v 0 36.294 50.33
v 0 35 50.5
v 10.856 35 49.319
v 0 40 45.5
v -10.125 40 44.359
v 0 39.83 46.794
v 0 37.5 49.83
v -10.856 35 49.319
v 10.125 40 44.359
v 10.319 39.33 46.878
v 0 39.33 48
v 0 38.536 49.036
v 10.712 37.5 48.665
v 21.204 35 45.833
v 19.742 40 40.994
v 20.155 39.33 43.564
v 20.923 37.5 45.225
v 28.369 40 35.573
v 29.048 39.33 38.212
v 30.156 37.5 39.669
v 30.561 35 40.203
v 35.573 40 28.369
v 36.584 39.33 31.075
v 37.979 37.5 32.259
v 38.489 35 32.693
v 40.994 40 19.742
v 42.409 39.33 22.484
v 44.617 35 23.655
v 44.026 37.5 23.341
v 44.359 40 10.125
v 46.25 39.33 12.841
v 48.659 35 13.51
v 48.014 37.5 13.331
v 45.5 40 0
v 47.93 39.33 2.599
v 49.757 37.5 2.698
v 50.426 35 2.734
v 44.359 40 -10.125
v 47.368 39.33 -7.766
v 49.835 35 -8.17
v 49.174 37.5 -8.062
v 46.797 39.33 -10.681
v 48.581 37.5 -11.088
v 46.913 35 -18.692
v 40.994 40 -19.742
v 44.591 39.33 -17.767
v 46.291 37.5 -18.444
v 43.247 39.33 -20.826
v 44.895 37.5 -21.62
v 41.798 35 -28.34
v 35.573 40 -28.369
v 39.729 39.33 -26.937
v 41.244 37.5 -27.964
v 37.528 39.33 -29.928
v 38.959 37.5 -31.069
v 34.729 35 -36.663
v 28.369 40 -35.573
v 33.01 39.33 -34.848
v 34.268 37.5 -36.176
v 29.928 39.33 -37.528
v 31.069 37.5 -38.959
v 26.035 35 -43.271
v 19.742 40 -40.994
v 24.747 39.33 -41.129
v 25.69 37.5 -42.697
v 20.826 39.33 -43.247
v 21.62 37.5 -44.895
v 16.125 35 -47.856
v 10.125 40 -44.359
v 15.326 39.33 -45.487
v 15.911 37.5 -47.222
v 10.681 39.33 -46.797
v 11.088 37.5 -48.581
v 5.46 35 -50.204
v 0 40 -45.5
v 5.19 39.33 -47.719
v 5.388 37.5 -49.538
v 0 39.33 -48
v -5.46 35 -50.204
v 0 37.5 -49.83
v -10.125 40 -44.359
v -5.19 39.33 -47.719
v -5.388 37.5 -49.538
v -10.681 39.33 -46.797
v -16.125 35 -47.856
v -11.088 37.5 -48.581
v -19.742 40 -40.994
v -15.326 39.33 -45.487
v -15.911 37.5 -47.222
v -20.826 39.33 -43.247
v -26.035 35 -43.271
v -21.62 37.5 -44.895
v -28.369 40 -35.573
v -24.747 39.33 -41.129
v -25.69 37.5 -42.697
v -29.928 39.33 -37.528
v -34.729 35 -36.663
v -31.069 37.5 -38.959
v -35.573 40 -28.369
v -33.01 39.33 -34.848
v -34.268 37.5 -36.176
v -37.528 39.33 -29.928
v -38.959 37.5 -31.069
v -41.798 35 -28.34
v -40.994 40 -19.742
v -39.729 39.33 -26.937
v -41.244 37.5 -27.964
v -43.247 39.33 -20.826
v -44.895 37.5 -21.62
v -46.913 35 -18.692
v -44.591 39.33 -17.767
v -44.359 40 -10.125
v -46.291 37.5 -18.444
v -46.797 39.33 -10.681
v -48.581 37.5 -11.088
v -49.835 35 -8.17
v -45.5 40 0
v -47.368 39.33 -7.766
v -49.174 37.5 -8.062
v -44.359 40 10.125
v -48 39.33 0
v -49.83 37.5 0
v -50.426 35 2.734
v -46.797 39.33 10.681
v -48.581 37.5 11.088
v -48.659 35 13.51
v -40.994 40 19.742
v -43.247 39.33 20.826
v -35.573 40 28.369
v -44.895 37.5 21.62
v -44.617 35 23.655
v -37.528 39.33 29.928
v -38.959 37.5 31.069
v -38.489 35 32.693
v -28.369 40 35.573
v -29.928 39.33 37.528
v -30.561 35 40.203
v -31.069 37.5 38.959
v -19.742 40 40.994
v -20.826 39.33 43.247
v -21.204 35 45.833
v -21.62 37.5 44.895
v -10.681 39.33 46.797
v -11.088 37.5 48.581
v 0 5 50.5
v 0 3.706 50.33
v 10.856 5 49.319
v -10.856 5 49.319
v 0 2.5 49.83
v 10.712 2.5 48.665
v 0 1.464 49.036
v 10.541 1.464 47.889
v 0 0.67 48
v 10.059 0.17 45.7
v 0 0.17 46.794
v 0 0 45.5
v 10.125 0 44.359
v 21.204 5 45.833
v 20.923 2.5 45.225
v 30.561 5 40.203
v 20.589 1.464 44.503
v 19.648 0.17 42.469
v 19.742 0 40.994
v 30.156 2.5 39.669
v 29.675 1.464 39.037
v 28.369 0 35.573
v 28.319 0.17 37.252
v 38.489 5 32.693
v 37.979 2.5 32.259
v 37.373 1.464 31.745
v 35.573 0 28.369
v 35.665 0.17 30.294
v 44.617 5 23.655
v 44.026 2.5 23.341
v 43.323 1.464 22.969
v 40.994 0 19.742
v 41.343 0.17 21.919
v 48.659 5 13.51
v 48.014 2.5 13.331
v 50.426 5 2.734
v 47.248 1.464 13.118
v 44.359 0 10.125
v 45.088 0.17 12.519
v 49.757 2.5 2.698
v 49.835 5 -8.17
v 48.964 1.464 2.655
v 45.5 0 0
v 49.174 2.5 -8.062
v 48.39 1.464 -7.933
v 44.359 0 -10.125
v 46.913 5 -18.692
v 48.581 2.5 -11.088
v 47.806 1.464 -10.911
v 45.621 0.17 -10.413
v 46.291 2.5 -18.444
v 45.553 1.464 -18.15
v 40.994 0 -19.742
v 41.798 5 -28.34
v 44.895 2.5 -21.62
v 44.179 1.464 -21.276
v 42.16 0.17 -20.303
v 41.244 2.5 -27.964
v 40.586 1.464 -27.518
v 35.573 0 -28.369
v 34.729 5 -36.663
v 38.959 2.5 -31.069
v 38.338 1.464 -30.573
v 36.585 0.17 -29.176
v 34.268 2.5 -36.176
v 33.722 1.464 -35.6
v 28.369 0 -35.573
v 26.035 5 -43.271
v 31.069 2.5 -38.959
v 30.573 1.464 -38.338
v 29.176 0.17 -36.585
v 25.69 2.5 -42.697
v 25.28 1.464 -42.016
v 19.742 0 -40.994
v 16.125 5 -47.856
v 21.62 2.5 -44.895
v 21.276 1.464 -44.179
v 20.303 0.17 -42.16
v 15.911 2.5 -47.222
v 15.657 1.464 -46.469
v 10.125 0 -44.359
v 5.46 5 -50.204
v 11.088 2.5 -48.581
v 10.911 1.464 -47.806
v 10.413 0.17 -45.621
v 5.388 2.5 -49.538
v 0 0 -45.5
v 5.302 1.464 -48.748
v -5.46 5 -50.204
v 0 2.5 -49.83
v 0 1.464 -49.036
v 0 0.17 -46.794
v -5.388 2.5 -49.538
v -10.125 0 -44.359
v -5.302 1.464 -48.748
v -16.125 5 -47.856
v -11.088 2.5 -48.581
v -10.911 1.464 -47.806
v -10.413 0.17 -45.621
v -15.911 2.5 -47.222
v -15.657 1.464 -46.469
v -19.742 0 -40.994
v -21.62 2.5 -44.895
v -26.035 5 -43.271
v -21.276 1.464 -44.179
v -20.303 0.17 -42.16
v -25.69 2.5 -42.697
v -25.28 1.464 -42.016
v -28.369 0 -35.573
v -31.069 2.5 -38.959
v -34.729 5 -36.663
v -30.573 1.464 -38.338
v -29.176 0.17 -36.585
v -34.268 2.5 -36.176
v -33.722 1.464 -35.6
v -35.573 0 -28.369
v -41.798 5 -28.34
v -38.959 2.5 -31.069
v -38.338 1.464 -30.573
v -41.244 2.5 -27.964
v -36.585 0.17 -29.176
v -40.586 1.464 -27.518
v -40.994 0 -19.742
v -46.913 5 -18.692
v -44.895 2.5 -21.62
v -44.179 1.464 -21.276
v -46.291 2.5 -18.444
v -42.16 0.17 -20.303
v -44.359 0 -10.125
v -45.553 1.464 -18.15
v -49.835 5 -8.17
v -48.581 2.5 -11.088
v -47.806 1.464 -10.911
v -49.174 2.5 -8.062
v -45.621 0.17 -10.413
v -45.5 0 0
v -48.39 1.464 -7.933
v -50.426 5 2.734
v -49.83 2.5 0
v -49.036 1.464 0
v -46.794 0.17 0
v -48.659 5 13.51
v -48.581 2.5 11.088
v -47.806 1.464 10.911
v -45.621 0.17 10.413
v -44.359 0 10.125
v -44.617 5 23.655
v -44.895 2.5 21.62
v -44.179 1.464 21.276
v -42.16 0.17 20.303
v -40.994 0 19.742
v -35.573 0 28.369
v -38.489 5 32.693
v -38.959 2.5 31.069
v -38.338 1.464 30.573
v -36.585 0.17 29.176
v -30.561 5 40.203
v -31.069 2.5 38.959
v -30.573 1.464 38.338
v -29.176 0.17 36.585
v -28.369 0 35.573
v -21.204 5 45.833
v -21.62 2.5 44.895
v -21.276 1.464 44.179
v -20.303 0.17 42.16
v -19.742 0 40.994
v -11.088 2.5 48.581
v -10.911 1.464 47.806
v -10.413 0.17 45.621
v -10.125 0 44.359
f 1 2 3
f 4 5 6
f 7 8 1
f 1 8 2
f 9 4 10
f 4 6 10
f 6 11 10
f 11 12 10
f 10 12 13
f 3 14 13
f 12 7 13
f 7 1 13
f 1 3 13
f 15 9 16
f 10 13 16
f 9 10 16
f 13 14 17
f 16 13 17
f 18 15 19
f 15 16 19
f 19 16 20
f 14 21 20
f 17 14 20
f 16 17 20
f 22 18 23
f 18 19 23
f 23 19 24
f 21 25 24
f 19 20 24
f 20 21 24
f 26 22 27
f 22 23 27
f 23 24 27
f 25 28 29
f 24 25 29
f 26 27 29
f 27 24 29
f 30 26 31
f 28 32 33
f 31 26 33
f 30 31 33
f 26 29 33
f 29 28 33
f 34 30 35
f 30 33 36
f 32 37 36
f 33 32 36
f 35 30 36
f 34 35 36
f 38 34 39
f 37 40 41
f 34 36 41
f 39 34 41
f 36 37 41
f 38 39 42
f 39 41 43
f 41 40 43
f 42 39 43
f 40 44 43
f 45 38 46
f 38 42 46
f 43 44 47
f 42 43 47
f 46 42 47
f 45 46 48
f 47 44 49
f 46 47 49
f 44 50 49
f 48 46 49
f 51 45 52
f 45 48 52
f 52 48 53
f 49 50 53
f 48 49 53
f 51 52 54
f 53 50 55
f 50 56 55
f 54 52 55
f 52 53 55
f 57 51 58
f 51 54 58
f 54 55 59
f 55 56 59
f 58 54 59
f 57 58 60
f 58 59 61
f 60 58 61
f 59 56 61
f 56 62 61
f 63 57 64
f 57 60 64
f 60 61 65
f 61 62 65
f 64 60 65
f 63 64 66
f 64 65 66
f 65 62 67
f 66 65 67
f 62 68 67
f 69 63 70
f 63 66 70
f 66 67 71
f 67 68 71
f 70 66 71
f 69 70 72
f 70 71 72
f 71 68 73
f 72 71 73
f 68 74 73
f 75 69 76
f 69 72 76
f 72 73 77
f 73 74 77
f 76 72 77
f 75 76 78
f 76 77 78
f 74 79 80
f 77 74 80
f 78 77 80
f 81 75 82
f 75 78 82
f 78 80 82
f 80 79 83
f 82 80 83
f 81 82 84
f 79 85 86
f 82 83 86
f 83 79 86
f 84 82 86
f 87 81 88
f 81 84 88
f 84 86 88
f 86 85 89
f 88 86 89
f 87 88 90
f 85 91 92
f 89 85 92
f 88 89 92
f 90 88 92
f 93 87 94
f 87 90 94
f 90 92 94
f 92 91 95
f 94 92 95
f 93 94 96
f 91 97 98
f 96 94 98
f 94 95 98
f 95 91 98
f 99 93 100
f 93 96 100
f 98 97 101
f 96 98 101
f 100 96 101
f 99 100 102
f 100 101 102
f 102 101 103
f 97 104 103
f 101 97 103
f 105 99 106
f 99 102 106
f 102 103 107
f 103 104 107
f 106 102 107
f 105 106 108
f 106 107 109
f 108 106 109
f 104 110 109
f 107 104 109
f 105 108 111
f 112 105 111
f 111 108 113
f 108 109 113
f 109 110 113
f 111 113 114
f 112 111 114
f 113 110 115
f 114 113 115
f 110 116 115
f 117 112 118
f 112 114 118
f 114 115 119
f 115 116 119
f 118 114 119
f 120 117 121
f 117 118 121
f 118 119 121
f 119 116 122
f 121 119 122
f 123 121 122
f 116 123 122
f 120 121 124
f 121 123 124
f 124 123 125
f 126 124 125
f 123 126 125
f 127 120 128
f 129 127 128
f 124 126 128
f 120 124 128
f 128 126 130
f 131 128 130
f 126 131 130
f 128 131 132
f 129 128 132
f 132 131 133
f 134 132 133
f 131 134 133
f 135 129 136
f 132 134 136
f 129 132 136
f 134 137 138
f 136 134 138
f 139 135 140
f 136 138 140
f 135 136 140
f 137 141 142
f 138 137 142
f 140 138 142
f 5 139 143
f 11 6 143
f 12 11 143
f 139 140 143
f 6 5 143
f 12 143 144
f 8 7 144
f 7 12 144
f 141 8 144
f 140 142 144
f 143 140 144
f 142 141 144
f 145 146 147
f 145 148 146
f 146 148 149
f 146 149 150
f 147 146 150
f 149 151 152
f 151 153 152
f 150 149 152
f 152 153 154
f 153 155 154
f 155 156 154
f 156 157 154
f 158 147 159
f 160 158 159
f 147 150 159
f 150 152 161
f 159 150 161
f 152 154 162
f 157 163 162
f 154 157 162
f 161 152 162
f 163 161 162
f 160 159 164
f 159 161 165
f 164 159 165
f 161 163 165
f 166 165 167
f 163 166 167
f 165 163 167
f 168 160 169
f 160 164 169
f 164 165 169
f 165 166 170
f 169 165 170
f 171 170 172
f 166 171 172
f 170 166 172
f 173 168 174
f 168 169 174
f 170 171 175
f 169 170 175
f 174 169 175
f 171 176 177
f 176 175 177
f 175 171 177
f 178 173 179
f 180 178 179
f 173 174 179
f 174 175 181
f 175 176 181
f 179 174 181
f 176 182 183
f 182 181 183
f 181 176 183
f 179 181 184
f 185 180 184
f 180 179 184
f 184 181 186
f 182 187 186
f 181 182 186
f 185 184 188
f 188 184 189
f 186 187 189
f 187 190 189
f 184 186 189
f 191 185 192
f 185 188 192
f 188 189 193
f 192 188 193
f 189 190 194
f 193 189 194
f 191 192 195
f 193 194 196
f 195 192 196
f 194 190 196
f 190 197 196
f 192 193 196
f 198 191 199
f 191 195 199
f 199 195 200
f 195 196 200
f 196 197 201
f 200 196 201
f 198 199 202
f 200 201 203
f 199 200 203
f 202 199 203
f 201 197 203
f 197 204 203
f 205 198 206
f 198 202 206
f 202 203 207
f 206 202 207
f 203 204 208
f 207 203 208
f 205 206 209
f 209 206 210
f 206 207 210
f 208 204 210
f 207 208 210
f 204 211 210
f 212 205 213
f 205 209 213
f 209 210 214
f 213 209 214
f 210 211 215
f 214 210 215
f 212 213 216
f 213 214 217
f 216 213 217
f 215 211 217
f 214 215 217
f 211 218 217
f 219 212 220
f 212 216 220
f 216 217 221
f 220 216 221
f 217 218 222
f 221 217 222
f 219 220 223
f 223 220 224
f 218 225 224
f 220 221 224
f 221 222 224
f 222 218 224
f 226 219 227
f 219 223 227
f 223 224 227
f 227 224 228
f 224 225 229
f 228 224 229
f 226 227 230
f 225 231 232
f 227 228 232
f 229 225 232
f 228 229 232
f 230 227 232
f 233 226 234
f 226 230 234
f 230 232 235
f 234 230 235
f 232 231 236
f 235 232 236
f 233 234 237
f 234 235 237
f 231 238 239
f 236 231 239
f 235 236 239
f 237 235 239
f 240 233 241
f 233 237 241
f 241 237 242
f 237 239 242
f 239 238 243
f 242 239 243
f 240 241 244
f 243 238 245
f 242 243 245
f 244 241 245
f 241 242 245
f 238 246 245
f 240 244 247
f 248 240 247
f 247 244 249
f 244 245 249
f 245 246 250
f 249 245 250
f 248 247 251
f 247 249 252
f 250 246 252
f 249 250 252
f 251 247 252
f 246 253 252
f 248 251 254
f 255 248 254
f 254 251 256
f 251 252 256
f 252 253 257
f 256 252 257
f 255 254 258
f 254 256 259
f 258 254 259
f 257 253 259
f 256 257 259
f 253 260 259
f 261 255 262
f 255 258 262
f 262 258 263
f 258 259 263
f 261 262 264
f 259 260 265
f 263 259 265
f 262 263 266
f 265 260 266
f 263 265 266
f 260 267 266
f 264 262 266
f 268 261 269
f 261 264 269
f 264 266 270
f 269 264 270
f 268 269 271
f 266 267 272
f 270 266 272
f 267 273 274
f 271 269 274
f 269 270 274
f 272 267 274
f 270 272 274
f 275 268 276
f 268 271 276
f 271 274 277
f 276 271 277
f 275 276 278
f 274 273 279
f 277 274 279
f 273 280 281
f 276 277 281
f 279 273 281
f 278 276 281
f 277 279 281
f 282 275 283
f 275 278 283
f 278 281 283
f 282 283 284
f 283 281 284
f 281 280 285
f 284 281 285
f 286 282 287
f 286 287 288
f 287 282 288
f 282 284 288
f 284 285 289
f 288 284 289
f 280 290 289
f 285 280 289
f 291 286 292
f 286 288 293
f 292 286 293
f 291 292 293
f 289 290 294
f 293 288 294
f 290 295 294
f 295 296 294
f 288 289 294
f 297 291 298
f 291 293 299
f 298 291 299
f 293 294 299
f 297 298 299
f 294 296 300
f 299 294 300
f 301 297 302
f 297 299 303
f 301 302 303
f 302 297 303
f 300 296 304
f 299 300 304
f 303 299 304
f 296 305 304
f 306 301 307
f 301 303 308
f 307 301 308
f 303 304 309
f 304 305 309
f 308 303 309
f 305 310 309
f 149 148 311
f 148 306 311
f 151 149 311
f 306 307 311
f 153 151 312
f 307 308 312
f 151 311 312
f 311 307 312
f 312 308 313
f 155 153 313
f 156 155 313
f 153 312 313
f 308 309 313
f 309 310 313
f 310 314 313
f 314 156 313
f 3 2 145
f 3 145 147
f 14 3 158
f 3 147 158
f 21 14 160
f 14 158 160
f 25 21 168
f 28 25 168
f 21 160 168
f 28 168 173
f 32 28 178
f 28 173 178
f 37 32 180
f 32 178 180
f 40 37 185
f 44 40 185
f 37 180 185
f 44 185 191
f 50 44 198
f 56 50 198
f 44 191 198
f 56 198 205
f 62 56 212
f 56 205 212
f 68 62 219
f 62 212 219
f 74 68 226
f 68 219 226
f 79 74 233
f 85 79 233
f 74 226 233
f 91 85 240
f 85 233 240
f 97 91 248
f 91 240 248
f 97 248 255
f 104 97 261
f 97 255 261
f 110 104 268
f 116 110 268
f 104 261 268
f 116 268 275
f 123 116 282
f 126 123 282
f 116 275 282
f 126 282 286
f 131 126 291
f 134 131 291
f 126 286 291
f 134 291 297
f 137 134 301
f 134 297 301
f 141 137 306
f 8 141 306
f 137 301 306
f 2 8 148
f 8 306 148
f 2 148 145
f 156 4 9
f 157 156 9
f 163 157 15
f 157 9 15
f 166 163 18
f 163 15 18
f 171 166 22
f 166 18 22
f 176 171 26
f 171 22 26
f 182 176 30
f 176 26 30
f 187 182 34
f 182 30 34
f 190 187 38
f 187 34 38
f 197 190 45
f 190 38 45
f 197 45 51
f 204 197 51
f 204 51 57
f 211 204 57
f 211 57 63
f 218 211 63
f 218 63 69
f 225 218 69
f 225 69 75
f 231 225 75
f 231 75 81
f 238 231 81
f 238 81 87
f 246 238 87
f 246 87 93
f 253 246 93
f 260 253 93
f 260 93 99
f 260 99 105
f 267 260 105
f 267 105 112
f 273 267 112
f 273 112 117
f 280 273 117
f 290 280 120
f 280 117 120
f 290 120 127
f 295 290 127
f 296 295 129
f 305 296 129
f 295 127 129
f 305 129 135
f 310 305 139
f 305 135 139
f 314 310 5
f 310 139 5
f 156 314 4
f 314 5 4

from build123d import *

# Parameters (mm, degrees)
SKETCH1_R            = 50.5
SKETCH1_R_2          = 45
SKETCH1_R_3          = 40
BOSS_EXTRUDE1_DEPTH  = 40
FILLET1_R            = 5
FILLET2_R            = 5
CUT_EXTRUDE1_START   = -0.5
SKETCH2_R            = 41.5
SKETCH2_R_2          = 40
CUT_EXTRUDE1_DEPTH   = 0.5
SKETCH3_R            = 1
BOSS_EXTRUDE2_DEPTH  = 5
SKETCH4_R            = 12
BOSS_EXTRUDE3_DEPTH  = 7.5
CUT_EXTRUDE2_DEPTH   = 5
SKETCH6_R            = 6
CUT_EXTRUDE3_DEPTH   = 79.259184829
BOSS_EXTRUDE10_START = -12.5
BOSS_EXTRUDE10_DEPTH = 12.5
CIRPATTERN2_START    = 27
CIRPATTERN2_DEPTH    = 12.5
SKETCH8_R            = 45.5
CUT_EXTRUDE4_DEPTH   = 82.85658196


# Read off the part's stored shape, not the designer's step: Boss-Extrude10, CirPattern2, Cut-Revolve1
with BuildPart() as part:
    # Sketch1 → Boss-Extrude1 (new body)
    # profile 1 of 2: a face of its own
    with BuildSketch(Plane(origin=(0, 0, 0), x_dir=(1, 0, 0), z_dir=(0, 1, 0))):
        with Locations(Location((0, 0, 0), (0, 0, 270))):
            Circle(SKETCH1_R)
        Circle(SKETCH1_R_2, mode=Mode.SUBTRACT)
    # profile 2 of 2: a face of its own
    with BuildSketch(Plane(origin=(0, 0, 0), x_dir=(1, 0, 0), z_dir=(0, 1, 0))):
        Circle(SKETCH1_R_2)
        with Locations(Location((0, 0, 0), (0, 0, 270))):
            Circle(SKETCH1_R_3, mode=Mode.SUBTRACT)
    extrude(amount=BOSS_EXTRUDE1_DEPTH)

    # Fillet1
    fillet1_edges = [part.edges().sort_by_distance(p)[0] for p in [
        (0, 40, -50.5),
    ]]
    fillet(fillet1_edges, radius=FILLET1_R)

    # Fillet2
    fillet2_edges = [part.edges().sort_by_distance(p)[0] for p in [
        (0, 0, -50.5),
    ]]
    fillet(fillet2_edges, radius=FILLET2_R)

    # Sketch2 → Cut-Extrude1 (cut)
    with BuildSketch(Plane(origin=(0, 40, 0), x_dir=(1, 0, 0), z_dir=(0, 1, 0)).offset(CUT_EXTRUDE1_START)):
        with Locations(Location((0, 0, 0), (0, 0, 270))):
            Circle(SKETCH2_R)
        with Locations(Location((0, 0, 0), (0, 0, 270))):
            Circle(SKETCH2_R_2, mode=Mode.SUBTRACT)
    extrude(amount=CUT_EXTRUDE1_DEPTH, mode=Mode.SUBTRACT)


with BuildPart() as body_2:
    # Sketch3 → Boss-Extrude2 (new body)
    with BuildSketch(Plane(origin=(0, 39.5, 0), x_dir=(1, 0, 0), z_dir=(0, 1, 0))):
        with Locations(Location((0, 0, 0), (0, 0, 270))):
            Circle(SKETCH3_R)
    extrude(amount=-BOSS_EXTRUDE2_DEPTH)

    # Sketch4 → Boss-Extrude3 (add)
    with BuildSketch(Plane.XZ.offset(-34.5)):
        with Locations(Location((0, 0, 0), (0, 0, 270))):
            Circle(SKETCH4_R)
    extrude(amount=BOSS_EXTRUDE3_DEPTH)

    # Sketch5 → Cut-Extrude2 (cut)
    with BuildSketch(Plane.XZ.offset(-27)):
        Polygon((1.172923904, 10.937287119), (-8.885506541, 6.484425457), (-10.058430445, -4.452861662), (-1.172923904, -10.937287119), (8.885506541, -6.484425457), (10.058430445, 4.452861662), align=None)
    extrude(amount=-CUT_EXTRUDE2_DEPTH, mode=Mode.SUBTRACT)

    # Sketch6 → Cut-Extrude3 (cut, through all)
    with BuildSketch(Plane.XZ.offset(-32)):
        with Locations(Location((0, 0, 0), (0, 0, 270))):
            Circle(SKETCH6_R)
    extrude(amount=-CUT_EXTRUDE3_DEPTH, mode=Mode.SUBTRACT)

    # Boss-Extrude10 outline → Boss-Extrude10 (add)
    with BuildSketch(Plane(origin=(0, 39.5, 0), x_dir=(1, 0, 0), z_dir=(0, 1, 0)).offset(BOSS_EXTRUDE10_START)):
        with BuildLine():
            ThreePointArc((-9.907874683, -6.770082663), (-10.682049717, -5.467523557), (-11.285904868, -4.077787551))
            ThreePointArc((-11.285904868, -4.077787551), (-11.291897259, -4.637537864), (-11.663342081, -5.056327867))
            Line((-11.663342081, -5.056327867), (-14.441281094, -6.530254709))
            ThreePointArc((-14.441281094, -6.530254709), (-15.188724822, -6.754494743), (-15.965085937, -6.675633223))
            Line((-15.965085937, -6.675633223), (-39.993984407, 0.693693915))
            ThreePointArc((-39.993984407, 0.693693915), (-39.913717484, -2.625863016), (-39.558397626, -5.927324632))
            ThreePointArc((-39.558397626, -5.927324632), (-38.549233859, -3.209595167), (-35.711897206, -2.614628217))
            Line((-35.711897206, -2.614628217), (-16.968675274, -8.362912276))
            ThreePointArc((-16.968675274, -8.362912276), (-16.496554918, -8.752791347), (-16.438401548, -9.362316987))
            Line((-16.438401548, -9.362316987), (-22.186706389, -28.105606681))
            ThreePointArc((-22.186706389, -28.105606681), (-24.270105502, -30.121529322), (-27.086328062, -29.433498469))
            ThreePointArc((-27.086328062, -29.433498469), (-25.333453103, -30.955066692), (-23.495271849, -32.372398749))
            Line((-23.495271849, -32.372398749), (-22.678682838, -32.949618279))
            Line((-22.678682838, -32.949618279), (-21.84791965, -33.506244298))
            Line((-21.84791965, -33.506244298), (-14.474389556, -9.463641401))
            ThreePointArc((-14.474389556, -9.463641401), (-14.104425603, -8.776547206), (-13.499682622, -8.283335601))
            Line((-13.499682622, -8.283335601), (-10.652684086, -6.77276696))
            ThreePointArc((-10.652684086, -6.77276696), (-10.280610826, -6.679459968), (-9.907874683, -6.770082663))
        make_face()
    extrude(amount=BOSS_EXTRUDE10_DEPTH)

    # CirPattern2 outline → CirPattern2 (add)
    with BuildSketch(Plane(origin=(0, 0, 0), x_dir=(1, 0, 0), z_dir=(0, 1, 0)).offset(CIRPATTERN2_START)):
        with BuildLine():
            ThreePointArc((-9.500432888, 7.330878183), (-8.500858804, 8.469675294), (-7.365742824, 9.473427714))
            ThreePointArc((-7.365742824, 9.473427714), (-7.899948758, 9.306154457), (-8.413024481, 9.530006248))
            Line((-8.413024481, 9.530006248), (-10.673242573, 11.716514805))
            ThreePointArc((-10.673242573, 11.716514805), (-11.117480333, 12.358082052), (-11.282387348, 13.120814899))
            Line((-11.282387348, 13.120814899), (-11.699078736, 38.250902692))
            ThreePointArc((-11.699078736, 38.250902692), (-14.831361144, 37.148764806), (-17.861437852, 35.790627793))
            ThreePointArc((-17.861437852, 35.790627793), (-14.964874781, 35.670680608), (-13.522242341, 33.156067994))
            Line((-13.522242341, 33.156067994), (-13.197211247, 13.553887176))
            ThreePointArc((-13.197211247, 13.553887176), (-13.422115065, 12.984394777), (-13.983838017, 12.740733854))
            Line((-13.983838017, 12.740733854), (-33.586089702, 12.415701585))
            ThreePointArc((-33.586089702, 12.415701585), (-36.147151798, 13.774177532), (-36.363056203, 16.665177575))
            ThreePointArc((-36.363056203, 16.665177575), (-37.268485425, 14.527903984), (-38.048419067, 12.341710032))
            Line((-38.048419067, 12.341710032), (-38.345047581, 11.386717087))
            Line((-38.345047581, 11.386717087), (-38.61771044, 10.424607444))
            Line((-38.61771044, 10.424607444), (-13.473290178, 10.841536484))
            ThreePointArc((-13.473290178, 10.841536484), (-12.705499618, 10.70200364), (-12.049551649, 10.279269655))
            Line((-12.049551649, 10.279269655), (-9.733144569, 8.038404527))
            ThreePointArc((-9.733144569, 8.038404527), (-9.529427386, 7.713375274), (-9.500432888, 7.330878183))
        make_face()
        with BuildLine():
            ThreePointArc((4.03628425, 11.300814548), (5.428230042, 10.702070763), (6.73362545, 9.932687868))
            ThreePointArc((6.73362545, 9.932687868), (6.409460418, 10.389057624), (6.463807004, 10.946195641))
            Line((6.463807004, 10.946195641), (7.844854414, 13.771459088))
            ThreePointArc((7.844854414, 13.771459088), (8.317744107, 14.392209487), (8.992187082, 14.784742791))
            Line((8.992187082, 14.784742791), (32.763556111, 22.946664049))
            ThreePointArc((32.763556111, 22.946664049), (30.747432198, 25.585062307), (28.519421945, 28.047149087))
            ThreePointArc((28.519421945, 28.047149087), (29.300432607, 25.255288185), (27.354691835, 23.106205171))
            Line((27.354691835, 23.106205171), (8.812350166, 16.739675231))
            ThreePointArc((8.812350166, 16.739675231), (8.201231607, 16.777588643), (7.795914361, 17.23652355))
            Line((7.795914361, 17.23652355), (1.429361404, 35.778932255))
            ThreePointArc((1.429361404, 35.778932255), (1.929937095, 38.634439204), (4.612723394, 39.733144639))
            ThreePointArc((4.612723394, 39.733144639), (2.300262401, 39.933805139), (-0.019944352, 39.999995028))
            Line((-0.019944352, 39.999995028), (-1.019859867, 39.986996459))
            Line((-1.019859867, 39.986996459), (-2.01913797, 39.949006018))
            Line((-2.01913797, 39.949006018), (6.147438285, 16.164079439))
            ThreePointArc((6.147438285, 16.164079439), (6.251994995, 15.390749203), (6.052650154, 14.636273627))
            Line((6.052650154, 14.636273627), (4.637269925, 11.740774173))
            ThreePointArc((4.637269925, 11.740774173), (4.391100809, 11.446588055), (4.03628425, 11.300814548))
        make_face()
        with BuildLine():
            ThreePointArc((11.994993743, -0.346590692), (11.855689469, -1.855431813), (11.52735222, -3.334689012))
            ThreePointArc((11.52735222, -3.334689012), (11.861213145, -2.885363735), (12.407876906, -2.764885294))
            Line((12.407876906, -2.764885294), (15.521629237, -3.205285014))
            ThreePointArc((15.521629237, -3.205285014), (16.258128901, -3.463207416), (16.839864598, -3.98334134))
            Line((16.839864598, -3.98334134), (31.948070005, -24.069084381))
            ThreePointArc((31.948070005, -24.069084381), (33.834319309, -21.336326696), (35.487409954, -18.45653637))
            ThreePointArc((35.487409954, -18.45653637), (33.073538017, -20.062054114), (30.428371647, -18.875647848))
            Line((30.428371647, -18.875647848), (18.643543171, -3.208198923))
            ThreePointArc((18.643543171, -3.208198923), (18.490754948, -2.615274747), (18.801978065, -2.087976452))
            Line((18.801978065, -2.087976452), (34.469483632, 9.69689463))
            ThreePointArc((34.469483632, 9.69689463), (37.339918519, 10.103219032), (39.213876041, 7.891256292))
            ThreePointArc((39.213876041, 7.891256292), (38.690125771, 10.152544892), (38.036092779, 12.379646445))
            Line((38.036092779, 12.379646445), (37.714739519, 13.326605833))
            Line((37.714739519, 13.326605833), (37.369814547, 14.265236092))
            Line((37.369814547, 14.265236092), (17.272615982, -0.851585994))
            ThreePointArc((17.272615982, -0.851585994), (16.569445022, -1.18999752), (15.790295166, -1.233555084))
            Line((15.790295166, -1.233555084), (12.599134998, -0.782207034))
            ThreePointArc((12.599134998, -0.782207034), (12.243276933, -0.638994801), (11.994993743, -0.346590692))
        make_face()
        with BuildLine():
            ThreePointArc((3.377029578, -11.515019376), (1.89898901, -11.848790687), (0.390670022, -11.99363902))
            ThreePointArc((0.390670022, -11.99363902), (0.921172454, -12.172310482), (1.204682652, -12.654988728))
            Line((1.204682652, -12.654988728), (1.748040016, -15.75243417))
            ThreePointArc((1.748040016, -15.75243417), (1.730332147, -16.53258938), (1.415421606, -17.246583128))
            Line((1.415421606, -17.246583128), (-13.018562973, -37.822176274))
            ThreePointArc((-13.018562973, -37.822176274), (-9.836672879, -38.7716374), (-6.586996421, -39.453915879))
            ThreePointArc((-6.586996421, -39.453915879), (-8.859861984, -37.654319512), (-8.548923935, -34.7719971))
            Line((-8.548923935, -34.7719971), (2.709993184, -18.722451208))
            ThreePointArc((2.709993184, -18.722451208), (3.226683428, -18.393917326), (3.824347139, -18.526963966))
            Line((3.824347139, -18.526963966), (19.873951055, -29.785921788))
            ThreePointArc((19.873951055, -29.785921788), (21.147401687, -32.390306446), (19.62278483, -34.856080037))
            ThreePointArc((19.62278483, -34.856080037), (21.611550355, -33.659187323), (23.527542489, -32.348952756))
            Line((23.527542489, -32.348952756), (24.328850767, -31.7507011))
            Line((24.328850767, -31.7507011), (25.114953513, -31.132605256))
            Line((25.114953513, -31.132605256), (4.527625467, -16.690388528))
            ThreePointArc((4.527625467, -16.690388528), (3.988485204, -16.126208116), (3.706288951, -15.398652596))
            Line((3.706288951, -15.398652596), (3.149423732, -12.224204706))
            ThreePointArc((3.149423732, -12.224204706), (3.17566047, -11.841508561), (3.377029578, -11.515019376))
        make_face()
    extrude(amount=CIRPATTERN2_DEPTH)

    # Cut-Revolve1 outline → Cut-Revolve1 (revolve, cut)
    with BuildSketch(Plane.XY):
        with BuildLine():
            Line((12, 39.5), (12, 34.5))
            add(Edge.make_bspline(
                [(12, 34.5), (18.404764838, 39.5), (40, 39.5)],
                knots=[0, 0, 0, 1, 1, 1], degree=2))
            Line((40, 39.5), (12, 39.5))
        make_face()
    revolve(axis=Axis((0, 0, 0), (0, 1, 0)), mode=Mode.SUBTRACT)


with BuildPart() as cut_extrude4_tool:
    # Sketch8 → Cut-Extrude4 (new, through all)
    with BuildSketch(Plane(origin=(0, 40, 0), x_dir=(1, 0, 0), z_dir=(0, 1, 0))):
        with Locations(Location((0, 0, 0), (0, 0, 270))):
            Circle(SKETCH8_R)
    extrude(amount=-CUT_EXTRUDE4_DEPTH)


with BuildPart() as part_1:
    add(part.part)

    # Cut-Extrude4: cut by cut_extrude4_tool
    add(cut_extrude4_tool.part, mode=Mode.SUBTRACT)


with BuildPart() as body_2_1:
    add(body_2.part)

    # Cut-Extrude4: cut by cut_extrude4_tool
    add(cut_extrude4_tool.part, mode=Mode.SUBTRACT)


solid = part_1.part
